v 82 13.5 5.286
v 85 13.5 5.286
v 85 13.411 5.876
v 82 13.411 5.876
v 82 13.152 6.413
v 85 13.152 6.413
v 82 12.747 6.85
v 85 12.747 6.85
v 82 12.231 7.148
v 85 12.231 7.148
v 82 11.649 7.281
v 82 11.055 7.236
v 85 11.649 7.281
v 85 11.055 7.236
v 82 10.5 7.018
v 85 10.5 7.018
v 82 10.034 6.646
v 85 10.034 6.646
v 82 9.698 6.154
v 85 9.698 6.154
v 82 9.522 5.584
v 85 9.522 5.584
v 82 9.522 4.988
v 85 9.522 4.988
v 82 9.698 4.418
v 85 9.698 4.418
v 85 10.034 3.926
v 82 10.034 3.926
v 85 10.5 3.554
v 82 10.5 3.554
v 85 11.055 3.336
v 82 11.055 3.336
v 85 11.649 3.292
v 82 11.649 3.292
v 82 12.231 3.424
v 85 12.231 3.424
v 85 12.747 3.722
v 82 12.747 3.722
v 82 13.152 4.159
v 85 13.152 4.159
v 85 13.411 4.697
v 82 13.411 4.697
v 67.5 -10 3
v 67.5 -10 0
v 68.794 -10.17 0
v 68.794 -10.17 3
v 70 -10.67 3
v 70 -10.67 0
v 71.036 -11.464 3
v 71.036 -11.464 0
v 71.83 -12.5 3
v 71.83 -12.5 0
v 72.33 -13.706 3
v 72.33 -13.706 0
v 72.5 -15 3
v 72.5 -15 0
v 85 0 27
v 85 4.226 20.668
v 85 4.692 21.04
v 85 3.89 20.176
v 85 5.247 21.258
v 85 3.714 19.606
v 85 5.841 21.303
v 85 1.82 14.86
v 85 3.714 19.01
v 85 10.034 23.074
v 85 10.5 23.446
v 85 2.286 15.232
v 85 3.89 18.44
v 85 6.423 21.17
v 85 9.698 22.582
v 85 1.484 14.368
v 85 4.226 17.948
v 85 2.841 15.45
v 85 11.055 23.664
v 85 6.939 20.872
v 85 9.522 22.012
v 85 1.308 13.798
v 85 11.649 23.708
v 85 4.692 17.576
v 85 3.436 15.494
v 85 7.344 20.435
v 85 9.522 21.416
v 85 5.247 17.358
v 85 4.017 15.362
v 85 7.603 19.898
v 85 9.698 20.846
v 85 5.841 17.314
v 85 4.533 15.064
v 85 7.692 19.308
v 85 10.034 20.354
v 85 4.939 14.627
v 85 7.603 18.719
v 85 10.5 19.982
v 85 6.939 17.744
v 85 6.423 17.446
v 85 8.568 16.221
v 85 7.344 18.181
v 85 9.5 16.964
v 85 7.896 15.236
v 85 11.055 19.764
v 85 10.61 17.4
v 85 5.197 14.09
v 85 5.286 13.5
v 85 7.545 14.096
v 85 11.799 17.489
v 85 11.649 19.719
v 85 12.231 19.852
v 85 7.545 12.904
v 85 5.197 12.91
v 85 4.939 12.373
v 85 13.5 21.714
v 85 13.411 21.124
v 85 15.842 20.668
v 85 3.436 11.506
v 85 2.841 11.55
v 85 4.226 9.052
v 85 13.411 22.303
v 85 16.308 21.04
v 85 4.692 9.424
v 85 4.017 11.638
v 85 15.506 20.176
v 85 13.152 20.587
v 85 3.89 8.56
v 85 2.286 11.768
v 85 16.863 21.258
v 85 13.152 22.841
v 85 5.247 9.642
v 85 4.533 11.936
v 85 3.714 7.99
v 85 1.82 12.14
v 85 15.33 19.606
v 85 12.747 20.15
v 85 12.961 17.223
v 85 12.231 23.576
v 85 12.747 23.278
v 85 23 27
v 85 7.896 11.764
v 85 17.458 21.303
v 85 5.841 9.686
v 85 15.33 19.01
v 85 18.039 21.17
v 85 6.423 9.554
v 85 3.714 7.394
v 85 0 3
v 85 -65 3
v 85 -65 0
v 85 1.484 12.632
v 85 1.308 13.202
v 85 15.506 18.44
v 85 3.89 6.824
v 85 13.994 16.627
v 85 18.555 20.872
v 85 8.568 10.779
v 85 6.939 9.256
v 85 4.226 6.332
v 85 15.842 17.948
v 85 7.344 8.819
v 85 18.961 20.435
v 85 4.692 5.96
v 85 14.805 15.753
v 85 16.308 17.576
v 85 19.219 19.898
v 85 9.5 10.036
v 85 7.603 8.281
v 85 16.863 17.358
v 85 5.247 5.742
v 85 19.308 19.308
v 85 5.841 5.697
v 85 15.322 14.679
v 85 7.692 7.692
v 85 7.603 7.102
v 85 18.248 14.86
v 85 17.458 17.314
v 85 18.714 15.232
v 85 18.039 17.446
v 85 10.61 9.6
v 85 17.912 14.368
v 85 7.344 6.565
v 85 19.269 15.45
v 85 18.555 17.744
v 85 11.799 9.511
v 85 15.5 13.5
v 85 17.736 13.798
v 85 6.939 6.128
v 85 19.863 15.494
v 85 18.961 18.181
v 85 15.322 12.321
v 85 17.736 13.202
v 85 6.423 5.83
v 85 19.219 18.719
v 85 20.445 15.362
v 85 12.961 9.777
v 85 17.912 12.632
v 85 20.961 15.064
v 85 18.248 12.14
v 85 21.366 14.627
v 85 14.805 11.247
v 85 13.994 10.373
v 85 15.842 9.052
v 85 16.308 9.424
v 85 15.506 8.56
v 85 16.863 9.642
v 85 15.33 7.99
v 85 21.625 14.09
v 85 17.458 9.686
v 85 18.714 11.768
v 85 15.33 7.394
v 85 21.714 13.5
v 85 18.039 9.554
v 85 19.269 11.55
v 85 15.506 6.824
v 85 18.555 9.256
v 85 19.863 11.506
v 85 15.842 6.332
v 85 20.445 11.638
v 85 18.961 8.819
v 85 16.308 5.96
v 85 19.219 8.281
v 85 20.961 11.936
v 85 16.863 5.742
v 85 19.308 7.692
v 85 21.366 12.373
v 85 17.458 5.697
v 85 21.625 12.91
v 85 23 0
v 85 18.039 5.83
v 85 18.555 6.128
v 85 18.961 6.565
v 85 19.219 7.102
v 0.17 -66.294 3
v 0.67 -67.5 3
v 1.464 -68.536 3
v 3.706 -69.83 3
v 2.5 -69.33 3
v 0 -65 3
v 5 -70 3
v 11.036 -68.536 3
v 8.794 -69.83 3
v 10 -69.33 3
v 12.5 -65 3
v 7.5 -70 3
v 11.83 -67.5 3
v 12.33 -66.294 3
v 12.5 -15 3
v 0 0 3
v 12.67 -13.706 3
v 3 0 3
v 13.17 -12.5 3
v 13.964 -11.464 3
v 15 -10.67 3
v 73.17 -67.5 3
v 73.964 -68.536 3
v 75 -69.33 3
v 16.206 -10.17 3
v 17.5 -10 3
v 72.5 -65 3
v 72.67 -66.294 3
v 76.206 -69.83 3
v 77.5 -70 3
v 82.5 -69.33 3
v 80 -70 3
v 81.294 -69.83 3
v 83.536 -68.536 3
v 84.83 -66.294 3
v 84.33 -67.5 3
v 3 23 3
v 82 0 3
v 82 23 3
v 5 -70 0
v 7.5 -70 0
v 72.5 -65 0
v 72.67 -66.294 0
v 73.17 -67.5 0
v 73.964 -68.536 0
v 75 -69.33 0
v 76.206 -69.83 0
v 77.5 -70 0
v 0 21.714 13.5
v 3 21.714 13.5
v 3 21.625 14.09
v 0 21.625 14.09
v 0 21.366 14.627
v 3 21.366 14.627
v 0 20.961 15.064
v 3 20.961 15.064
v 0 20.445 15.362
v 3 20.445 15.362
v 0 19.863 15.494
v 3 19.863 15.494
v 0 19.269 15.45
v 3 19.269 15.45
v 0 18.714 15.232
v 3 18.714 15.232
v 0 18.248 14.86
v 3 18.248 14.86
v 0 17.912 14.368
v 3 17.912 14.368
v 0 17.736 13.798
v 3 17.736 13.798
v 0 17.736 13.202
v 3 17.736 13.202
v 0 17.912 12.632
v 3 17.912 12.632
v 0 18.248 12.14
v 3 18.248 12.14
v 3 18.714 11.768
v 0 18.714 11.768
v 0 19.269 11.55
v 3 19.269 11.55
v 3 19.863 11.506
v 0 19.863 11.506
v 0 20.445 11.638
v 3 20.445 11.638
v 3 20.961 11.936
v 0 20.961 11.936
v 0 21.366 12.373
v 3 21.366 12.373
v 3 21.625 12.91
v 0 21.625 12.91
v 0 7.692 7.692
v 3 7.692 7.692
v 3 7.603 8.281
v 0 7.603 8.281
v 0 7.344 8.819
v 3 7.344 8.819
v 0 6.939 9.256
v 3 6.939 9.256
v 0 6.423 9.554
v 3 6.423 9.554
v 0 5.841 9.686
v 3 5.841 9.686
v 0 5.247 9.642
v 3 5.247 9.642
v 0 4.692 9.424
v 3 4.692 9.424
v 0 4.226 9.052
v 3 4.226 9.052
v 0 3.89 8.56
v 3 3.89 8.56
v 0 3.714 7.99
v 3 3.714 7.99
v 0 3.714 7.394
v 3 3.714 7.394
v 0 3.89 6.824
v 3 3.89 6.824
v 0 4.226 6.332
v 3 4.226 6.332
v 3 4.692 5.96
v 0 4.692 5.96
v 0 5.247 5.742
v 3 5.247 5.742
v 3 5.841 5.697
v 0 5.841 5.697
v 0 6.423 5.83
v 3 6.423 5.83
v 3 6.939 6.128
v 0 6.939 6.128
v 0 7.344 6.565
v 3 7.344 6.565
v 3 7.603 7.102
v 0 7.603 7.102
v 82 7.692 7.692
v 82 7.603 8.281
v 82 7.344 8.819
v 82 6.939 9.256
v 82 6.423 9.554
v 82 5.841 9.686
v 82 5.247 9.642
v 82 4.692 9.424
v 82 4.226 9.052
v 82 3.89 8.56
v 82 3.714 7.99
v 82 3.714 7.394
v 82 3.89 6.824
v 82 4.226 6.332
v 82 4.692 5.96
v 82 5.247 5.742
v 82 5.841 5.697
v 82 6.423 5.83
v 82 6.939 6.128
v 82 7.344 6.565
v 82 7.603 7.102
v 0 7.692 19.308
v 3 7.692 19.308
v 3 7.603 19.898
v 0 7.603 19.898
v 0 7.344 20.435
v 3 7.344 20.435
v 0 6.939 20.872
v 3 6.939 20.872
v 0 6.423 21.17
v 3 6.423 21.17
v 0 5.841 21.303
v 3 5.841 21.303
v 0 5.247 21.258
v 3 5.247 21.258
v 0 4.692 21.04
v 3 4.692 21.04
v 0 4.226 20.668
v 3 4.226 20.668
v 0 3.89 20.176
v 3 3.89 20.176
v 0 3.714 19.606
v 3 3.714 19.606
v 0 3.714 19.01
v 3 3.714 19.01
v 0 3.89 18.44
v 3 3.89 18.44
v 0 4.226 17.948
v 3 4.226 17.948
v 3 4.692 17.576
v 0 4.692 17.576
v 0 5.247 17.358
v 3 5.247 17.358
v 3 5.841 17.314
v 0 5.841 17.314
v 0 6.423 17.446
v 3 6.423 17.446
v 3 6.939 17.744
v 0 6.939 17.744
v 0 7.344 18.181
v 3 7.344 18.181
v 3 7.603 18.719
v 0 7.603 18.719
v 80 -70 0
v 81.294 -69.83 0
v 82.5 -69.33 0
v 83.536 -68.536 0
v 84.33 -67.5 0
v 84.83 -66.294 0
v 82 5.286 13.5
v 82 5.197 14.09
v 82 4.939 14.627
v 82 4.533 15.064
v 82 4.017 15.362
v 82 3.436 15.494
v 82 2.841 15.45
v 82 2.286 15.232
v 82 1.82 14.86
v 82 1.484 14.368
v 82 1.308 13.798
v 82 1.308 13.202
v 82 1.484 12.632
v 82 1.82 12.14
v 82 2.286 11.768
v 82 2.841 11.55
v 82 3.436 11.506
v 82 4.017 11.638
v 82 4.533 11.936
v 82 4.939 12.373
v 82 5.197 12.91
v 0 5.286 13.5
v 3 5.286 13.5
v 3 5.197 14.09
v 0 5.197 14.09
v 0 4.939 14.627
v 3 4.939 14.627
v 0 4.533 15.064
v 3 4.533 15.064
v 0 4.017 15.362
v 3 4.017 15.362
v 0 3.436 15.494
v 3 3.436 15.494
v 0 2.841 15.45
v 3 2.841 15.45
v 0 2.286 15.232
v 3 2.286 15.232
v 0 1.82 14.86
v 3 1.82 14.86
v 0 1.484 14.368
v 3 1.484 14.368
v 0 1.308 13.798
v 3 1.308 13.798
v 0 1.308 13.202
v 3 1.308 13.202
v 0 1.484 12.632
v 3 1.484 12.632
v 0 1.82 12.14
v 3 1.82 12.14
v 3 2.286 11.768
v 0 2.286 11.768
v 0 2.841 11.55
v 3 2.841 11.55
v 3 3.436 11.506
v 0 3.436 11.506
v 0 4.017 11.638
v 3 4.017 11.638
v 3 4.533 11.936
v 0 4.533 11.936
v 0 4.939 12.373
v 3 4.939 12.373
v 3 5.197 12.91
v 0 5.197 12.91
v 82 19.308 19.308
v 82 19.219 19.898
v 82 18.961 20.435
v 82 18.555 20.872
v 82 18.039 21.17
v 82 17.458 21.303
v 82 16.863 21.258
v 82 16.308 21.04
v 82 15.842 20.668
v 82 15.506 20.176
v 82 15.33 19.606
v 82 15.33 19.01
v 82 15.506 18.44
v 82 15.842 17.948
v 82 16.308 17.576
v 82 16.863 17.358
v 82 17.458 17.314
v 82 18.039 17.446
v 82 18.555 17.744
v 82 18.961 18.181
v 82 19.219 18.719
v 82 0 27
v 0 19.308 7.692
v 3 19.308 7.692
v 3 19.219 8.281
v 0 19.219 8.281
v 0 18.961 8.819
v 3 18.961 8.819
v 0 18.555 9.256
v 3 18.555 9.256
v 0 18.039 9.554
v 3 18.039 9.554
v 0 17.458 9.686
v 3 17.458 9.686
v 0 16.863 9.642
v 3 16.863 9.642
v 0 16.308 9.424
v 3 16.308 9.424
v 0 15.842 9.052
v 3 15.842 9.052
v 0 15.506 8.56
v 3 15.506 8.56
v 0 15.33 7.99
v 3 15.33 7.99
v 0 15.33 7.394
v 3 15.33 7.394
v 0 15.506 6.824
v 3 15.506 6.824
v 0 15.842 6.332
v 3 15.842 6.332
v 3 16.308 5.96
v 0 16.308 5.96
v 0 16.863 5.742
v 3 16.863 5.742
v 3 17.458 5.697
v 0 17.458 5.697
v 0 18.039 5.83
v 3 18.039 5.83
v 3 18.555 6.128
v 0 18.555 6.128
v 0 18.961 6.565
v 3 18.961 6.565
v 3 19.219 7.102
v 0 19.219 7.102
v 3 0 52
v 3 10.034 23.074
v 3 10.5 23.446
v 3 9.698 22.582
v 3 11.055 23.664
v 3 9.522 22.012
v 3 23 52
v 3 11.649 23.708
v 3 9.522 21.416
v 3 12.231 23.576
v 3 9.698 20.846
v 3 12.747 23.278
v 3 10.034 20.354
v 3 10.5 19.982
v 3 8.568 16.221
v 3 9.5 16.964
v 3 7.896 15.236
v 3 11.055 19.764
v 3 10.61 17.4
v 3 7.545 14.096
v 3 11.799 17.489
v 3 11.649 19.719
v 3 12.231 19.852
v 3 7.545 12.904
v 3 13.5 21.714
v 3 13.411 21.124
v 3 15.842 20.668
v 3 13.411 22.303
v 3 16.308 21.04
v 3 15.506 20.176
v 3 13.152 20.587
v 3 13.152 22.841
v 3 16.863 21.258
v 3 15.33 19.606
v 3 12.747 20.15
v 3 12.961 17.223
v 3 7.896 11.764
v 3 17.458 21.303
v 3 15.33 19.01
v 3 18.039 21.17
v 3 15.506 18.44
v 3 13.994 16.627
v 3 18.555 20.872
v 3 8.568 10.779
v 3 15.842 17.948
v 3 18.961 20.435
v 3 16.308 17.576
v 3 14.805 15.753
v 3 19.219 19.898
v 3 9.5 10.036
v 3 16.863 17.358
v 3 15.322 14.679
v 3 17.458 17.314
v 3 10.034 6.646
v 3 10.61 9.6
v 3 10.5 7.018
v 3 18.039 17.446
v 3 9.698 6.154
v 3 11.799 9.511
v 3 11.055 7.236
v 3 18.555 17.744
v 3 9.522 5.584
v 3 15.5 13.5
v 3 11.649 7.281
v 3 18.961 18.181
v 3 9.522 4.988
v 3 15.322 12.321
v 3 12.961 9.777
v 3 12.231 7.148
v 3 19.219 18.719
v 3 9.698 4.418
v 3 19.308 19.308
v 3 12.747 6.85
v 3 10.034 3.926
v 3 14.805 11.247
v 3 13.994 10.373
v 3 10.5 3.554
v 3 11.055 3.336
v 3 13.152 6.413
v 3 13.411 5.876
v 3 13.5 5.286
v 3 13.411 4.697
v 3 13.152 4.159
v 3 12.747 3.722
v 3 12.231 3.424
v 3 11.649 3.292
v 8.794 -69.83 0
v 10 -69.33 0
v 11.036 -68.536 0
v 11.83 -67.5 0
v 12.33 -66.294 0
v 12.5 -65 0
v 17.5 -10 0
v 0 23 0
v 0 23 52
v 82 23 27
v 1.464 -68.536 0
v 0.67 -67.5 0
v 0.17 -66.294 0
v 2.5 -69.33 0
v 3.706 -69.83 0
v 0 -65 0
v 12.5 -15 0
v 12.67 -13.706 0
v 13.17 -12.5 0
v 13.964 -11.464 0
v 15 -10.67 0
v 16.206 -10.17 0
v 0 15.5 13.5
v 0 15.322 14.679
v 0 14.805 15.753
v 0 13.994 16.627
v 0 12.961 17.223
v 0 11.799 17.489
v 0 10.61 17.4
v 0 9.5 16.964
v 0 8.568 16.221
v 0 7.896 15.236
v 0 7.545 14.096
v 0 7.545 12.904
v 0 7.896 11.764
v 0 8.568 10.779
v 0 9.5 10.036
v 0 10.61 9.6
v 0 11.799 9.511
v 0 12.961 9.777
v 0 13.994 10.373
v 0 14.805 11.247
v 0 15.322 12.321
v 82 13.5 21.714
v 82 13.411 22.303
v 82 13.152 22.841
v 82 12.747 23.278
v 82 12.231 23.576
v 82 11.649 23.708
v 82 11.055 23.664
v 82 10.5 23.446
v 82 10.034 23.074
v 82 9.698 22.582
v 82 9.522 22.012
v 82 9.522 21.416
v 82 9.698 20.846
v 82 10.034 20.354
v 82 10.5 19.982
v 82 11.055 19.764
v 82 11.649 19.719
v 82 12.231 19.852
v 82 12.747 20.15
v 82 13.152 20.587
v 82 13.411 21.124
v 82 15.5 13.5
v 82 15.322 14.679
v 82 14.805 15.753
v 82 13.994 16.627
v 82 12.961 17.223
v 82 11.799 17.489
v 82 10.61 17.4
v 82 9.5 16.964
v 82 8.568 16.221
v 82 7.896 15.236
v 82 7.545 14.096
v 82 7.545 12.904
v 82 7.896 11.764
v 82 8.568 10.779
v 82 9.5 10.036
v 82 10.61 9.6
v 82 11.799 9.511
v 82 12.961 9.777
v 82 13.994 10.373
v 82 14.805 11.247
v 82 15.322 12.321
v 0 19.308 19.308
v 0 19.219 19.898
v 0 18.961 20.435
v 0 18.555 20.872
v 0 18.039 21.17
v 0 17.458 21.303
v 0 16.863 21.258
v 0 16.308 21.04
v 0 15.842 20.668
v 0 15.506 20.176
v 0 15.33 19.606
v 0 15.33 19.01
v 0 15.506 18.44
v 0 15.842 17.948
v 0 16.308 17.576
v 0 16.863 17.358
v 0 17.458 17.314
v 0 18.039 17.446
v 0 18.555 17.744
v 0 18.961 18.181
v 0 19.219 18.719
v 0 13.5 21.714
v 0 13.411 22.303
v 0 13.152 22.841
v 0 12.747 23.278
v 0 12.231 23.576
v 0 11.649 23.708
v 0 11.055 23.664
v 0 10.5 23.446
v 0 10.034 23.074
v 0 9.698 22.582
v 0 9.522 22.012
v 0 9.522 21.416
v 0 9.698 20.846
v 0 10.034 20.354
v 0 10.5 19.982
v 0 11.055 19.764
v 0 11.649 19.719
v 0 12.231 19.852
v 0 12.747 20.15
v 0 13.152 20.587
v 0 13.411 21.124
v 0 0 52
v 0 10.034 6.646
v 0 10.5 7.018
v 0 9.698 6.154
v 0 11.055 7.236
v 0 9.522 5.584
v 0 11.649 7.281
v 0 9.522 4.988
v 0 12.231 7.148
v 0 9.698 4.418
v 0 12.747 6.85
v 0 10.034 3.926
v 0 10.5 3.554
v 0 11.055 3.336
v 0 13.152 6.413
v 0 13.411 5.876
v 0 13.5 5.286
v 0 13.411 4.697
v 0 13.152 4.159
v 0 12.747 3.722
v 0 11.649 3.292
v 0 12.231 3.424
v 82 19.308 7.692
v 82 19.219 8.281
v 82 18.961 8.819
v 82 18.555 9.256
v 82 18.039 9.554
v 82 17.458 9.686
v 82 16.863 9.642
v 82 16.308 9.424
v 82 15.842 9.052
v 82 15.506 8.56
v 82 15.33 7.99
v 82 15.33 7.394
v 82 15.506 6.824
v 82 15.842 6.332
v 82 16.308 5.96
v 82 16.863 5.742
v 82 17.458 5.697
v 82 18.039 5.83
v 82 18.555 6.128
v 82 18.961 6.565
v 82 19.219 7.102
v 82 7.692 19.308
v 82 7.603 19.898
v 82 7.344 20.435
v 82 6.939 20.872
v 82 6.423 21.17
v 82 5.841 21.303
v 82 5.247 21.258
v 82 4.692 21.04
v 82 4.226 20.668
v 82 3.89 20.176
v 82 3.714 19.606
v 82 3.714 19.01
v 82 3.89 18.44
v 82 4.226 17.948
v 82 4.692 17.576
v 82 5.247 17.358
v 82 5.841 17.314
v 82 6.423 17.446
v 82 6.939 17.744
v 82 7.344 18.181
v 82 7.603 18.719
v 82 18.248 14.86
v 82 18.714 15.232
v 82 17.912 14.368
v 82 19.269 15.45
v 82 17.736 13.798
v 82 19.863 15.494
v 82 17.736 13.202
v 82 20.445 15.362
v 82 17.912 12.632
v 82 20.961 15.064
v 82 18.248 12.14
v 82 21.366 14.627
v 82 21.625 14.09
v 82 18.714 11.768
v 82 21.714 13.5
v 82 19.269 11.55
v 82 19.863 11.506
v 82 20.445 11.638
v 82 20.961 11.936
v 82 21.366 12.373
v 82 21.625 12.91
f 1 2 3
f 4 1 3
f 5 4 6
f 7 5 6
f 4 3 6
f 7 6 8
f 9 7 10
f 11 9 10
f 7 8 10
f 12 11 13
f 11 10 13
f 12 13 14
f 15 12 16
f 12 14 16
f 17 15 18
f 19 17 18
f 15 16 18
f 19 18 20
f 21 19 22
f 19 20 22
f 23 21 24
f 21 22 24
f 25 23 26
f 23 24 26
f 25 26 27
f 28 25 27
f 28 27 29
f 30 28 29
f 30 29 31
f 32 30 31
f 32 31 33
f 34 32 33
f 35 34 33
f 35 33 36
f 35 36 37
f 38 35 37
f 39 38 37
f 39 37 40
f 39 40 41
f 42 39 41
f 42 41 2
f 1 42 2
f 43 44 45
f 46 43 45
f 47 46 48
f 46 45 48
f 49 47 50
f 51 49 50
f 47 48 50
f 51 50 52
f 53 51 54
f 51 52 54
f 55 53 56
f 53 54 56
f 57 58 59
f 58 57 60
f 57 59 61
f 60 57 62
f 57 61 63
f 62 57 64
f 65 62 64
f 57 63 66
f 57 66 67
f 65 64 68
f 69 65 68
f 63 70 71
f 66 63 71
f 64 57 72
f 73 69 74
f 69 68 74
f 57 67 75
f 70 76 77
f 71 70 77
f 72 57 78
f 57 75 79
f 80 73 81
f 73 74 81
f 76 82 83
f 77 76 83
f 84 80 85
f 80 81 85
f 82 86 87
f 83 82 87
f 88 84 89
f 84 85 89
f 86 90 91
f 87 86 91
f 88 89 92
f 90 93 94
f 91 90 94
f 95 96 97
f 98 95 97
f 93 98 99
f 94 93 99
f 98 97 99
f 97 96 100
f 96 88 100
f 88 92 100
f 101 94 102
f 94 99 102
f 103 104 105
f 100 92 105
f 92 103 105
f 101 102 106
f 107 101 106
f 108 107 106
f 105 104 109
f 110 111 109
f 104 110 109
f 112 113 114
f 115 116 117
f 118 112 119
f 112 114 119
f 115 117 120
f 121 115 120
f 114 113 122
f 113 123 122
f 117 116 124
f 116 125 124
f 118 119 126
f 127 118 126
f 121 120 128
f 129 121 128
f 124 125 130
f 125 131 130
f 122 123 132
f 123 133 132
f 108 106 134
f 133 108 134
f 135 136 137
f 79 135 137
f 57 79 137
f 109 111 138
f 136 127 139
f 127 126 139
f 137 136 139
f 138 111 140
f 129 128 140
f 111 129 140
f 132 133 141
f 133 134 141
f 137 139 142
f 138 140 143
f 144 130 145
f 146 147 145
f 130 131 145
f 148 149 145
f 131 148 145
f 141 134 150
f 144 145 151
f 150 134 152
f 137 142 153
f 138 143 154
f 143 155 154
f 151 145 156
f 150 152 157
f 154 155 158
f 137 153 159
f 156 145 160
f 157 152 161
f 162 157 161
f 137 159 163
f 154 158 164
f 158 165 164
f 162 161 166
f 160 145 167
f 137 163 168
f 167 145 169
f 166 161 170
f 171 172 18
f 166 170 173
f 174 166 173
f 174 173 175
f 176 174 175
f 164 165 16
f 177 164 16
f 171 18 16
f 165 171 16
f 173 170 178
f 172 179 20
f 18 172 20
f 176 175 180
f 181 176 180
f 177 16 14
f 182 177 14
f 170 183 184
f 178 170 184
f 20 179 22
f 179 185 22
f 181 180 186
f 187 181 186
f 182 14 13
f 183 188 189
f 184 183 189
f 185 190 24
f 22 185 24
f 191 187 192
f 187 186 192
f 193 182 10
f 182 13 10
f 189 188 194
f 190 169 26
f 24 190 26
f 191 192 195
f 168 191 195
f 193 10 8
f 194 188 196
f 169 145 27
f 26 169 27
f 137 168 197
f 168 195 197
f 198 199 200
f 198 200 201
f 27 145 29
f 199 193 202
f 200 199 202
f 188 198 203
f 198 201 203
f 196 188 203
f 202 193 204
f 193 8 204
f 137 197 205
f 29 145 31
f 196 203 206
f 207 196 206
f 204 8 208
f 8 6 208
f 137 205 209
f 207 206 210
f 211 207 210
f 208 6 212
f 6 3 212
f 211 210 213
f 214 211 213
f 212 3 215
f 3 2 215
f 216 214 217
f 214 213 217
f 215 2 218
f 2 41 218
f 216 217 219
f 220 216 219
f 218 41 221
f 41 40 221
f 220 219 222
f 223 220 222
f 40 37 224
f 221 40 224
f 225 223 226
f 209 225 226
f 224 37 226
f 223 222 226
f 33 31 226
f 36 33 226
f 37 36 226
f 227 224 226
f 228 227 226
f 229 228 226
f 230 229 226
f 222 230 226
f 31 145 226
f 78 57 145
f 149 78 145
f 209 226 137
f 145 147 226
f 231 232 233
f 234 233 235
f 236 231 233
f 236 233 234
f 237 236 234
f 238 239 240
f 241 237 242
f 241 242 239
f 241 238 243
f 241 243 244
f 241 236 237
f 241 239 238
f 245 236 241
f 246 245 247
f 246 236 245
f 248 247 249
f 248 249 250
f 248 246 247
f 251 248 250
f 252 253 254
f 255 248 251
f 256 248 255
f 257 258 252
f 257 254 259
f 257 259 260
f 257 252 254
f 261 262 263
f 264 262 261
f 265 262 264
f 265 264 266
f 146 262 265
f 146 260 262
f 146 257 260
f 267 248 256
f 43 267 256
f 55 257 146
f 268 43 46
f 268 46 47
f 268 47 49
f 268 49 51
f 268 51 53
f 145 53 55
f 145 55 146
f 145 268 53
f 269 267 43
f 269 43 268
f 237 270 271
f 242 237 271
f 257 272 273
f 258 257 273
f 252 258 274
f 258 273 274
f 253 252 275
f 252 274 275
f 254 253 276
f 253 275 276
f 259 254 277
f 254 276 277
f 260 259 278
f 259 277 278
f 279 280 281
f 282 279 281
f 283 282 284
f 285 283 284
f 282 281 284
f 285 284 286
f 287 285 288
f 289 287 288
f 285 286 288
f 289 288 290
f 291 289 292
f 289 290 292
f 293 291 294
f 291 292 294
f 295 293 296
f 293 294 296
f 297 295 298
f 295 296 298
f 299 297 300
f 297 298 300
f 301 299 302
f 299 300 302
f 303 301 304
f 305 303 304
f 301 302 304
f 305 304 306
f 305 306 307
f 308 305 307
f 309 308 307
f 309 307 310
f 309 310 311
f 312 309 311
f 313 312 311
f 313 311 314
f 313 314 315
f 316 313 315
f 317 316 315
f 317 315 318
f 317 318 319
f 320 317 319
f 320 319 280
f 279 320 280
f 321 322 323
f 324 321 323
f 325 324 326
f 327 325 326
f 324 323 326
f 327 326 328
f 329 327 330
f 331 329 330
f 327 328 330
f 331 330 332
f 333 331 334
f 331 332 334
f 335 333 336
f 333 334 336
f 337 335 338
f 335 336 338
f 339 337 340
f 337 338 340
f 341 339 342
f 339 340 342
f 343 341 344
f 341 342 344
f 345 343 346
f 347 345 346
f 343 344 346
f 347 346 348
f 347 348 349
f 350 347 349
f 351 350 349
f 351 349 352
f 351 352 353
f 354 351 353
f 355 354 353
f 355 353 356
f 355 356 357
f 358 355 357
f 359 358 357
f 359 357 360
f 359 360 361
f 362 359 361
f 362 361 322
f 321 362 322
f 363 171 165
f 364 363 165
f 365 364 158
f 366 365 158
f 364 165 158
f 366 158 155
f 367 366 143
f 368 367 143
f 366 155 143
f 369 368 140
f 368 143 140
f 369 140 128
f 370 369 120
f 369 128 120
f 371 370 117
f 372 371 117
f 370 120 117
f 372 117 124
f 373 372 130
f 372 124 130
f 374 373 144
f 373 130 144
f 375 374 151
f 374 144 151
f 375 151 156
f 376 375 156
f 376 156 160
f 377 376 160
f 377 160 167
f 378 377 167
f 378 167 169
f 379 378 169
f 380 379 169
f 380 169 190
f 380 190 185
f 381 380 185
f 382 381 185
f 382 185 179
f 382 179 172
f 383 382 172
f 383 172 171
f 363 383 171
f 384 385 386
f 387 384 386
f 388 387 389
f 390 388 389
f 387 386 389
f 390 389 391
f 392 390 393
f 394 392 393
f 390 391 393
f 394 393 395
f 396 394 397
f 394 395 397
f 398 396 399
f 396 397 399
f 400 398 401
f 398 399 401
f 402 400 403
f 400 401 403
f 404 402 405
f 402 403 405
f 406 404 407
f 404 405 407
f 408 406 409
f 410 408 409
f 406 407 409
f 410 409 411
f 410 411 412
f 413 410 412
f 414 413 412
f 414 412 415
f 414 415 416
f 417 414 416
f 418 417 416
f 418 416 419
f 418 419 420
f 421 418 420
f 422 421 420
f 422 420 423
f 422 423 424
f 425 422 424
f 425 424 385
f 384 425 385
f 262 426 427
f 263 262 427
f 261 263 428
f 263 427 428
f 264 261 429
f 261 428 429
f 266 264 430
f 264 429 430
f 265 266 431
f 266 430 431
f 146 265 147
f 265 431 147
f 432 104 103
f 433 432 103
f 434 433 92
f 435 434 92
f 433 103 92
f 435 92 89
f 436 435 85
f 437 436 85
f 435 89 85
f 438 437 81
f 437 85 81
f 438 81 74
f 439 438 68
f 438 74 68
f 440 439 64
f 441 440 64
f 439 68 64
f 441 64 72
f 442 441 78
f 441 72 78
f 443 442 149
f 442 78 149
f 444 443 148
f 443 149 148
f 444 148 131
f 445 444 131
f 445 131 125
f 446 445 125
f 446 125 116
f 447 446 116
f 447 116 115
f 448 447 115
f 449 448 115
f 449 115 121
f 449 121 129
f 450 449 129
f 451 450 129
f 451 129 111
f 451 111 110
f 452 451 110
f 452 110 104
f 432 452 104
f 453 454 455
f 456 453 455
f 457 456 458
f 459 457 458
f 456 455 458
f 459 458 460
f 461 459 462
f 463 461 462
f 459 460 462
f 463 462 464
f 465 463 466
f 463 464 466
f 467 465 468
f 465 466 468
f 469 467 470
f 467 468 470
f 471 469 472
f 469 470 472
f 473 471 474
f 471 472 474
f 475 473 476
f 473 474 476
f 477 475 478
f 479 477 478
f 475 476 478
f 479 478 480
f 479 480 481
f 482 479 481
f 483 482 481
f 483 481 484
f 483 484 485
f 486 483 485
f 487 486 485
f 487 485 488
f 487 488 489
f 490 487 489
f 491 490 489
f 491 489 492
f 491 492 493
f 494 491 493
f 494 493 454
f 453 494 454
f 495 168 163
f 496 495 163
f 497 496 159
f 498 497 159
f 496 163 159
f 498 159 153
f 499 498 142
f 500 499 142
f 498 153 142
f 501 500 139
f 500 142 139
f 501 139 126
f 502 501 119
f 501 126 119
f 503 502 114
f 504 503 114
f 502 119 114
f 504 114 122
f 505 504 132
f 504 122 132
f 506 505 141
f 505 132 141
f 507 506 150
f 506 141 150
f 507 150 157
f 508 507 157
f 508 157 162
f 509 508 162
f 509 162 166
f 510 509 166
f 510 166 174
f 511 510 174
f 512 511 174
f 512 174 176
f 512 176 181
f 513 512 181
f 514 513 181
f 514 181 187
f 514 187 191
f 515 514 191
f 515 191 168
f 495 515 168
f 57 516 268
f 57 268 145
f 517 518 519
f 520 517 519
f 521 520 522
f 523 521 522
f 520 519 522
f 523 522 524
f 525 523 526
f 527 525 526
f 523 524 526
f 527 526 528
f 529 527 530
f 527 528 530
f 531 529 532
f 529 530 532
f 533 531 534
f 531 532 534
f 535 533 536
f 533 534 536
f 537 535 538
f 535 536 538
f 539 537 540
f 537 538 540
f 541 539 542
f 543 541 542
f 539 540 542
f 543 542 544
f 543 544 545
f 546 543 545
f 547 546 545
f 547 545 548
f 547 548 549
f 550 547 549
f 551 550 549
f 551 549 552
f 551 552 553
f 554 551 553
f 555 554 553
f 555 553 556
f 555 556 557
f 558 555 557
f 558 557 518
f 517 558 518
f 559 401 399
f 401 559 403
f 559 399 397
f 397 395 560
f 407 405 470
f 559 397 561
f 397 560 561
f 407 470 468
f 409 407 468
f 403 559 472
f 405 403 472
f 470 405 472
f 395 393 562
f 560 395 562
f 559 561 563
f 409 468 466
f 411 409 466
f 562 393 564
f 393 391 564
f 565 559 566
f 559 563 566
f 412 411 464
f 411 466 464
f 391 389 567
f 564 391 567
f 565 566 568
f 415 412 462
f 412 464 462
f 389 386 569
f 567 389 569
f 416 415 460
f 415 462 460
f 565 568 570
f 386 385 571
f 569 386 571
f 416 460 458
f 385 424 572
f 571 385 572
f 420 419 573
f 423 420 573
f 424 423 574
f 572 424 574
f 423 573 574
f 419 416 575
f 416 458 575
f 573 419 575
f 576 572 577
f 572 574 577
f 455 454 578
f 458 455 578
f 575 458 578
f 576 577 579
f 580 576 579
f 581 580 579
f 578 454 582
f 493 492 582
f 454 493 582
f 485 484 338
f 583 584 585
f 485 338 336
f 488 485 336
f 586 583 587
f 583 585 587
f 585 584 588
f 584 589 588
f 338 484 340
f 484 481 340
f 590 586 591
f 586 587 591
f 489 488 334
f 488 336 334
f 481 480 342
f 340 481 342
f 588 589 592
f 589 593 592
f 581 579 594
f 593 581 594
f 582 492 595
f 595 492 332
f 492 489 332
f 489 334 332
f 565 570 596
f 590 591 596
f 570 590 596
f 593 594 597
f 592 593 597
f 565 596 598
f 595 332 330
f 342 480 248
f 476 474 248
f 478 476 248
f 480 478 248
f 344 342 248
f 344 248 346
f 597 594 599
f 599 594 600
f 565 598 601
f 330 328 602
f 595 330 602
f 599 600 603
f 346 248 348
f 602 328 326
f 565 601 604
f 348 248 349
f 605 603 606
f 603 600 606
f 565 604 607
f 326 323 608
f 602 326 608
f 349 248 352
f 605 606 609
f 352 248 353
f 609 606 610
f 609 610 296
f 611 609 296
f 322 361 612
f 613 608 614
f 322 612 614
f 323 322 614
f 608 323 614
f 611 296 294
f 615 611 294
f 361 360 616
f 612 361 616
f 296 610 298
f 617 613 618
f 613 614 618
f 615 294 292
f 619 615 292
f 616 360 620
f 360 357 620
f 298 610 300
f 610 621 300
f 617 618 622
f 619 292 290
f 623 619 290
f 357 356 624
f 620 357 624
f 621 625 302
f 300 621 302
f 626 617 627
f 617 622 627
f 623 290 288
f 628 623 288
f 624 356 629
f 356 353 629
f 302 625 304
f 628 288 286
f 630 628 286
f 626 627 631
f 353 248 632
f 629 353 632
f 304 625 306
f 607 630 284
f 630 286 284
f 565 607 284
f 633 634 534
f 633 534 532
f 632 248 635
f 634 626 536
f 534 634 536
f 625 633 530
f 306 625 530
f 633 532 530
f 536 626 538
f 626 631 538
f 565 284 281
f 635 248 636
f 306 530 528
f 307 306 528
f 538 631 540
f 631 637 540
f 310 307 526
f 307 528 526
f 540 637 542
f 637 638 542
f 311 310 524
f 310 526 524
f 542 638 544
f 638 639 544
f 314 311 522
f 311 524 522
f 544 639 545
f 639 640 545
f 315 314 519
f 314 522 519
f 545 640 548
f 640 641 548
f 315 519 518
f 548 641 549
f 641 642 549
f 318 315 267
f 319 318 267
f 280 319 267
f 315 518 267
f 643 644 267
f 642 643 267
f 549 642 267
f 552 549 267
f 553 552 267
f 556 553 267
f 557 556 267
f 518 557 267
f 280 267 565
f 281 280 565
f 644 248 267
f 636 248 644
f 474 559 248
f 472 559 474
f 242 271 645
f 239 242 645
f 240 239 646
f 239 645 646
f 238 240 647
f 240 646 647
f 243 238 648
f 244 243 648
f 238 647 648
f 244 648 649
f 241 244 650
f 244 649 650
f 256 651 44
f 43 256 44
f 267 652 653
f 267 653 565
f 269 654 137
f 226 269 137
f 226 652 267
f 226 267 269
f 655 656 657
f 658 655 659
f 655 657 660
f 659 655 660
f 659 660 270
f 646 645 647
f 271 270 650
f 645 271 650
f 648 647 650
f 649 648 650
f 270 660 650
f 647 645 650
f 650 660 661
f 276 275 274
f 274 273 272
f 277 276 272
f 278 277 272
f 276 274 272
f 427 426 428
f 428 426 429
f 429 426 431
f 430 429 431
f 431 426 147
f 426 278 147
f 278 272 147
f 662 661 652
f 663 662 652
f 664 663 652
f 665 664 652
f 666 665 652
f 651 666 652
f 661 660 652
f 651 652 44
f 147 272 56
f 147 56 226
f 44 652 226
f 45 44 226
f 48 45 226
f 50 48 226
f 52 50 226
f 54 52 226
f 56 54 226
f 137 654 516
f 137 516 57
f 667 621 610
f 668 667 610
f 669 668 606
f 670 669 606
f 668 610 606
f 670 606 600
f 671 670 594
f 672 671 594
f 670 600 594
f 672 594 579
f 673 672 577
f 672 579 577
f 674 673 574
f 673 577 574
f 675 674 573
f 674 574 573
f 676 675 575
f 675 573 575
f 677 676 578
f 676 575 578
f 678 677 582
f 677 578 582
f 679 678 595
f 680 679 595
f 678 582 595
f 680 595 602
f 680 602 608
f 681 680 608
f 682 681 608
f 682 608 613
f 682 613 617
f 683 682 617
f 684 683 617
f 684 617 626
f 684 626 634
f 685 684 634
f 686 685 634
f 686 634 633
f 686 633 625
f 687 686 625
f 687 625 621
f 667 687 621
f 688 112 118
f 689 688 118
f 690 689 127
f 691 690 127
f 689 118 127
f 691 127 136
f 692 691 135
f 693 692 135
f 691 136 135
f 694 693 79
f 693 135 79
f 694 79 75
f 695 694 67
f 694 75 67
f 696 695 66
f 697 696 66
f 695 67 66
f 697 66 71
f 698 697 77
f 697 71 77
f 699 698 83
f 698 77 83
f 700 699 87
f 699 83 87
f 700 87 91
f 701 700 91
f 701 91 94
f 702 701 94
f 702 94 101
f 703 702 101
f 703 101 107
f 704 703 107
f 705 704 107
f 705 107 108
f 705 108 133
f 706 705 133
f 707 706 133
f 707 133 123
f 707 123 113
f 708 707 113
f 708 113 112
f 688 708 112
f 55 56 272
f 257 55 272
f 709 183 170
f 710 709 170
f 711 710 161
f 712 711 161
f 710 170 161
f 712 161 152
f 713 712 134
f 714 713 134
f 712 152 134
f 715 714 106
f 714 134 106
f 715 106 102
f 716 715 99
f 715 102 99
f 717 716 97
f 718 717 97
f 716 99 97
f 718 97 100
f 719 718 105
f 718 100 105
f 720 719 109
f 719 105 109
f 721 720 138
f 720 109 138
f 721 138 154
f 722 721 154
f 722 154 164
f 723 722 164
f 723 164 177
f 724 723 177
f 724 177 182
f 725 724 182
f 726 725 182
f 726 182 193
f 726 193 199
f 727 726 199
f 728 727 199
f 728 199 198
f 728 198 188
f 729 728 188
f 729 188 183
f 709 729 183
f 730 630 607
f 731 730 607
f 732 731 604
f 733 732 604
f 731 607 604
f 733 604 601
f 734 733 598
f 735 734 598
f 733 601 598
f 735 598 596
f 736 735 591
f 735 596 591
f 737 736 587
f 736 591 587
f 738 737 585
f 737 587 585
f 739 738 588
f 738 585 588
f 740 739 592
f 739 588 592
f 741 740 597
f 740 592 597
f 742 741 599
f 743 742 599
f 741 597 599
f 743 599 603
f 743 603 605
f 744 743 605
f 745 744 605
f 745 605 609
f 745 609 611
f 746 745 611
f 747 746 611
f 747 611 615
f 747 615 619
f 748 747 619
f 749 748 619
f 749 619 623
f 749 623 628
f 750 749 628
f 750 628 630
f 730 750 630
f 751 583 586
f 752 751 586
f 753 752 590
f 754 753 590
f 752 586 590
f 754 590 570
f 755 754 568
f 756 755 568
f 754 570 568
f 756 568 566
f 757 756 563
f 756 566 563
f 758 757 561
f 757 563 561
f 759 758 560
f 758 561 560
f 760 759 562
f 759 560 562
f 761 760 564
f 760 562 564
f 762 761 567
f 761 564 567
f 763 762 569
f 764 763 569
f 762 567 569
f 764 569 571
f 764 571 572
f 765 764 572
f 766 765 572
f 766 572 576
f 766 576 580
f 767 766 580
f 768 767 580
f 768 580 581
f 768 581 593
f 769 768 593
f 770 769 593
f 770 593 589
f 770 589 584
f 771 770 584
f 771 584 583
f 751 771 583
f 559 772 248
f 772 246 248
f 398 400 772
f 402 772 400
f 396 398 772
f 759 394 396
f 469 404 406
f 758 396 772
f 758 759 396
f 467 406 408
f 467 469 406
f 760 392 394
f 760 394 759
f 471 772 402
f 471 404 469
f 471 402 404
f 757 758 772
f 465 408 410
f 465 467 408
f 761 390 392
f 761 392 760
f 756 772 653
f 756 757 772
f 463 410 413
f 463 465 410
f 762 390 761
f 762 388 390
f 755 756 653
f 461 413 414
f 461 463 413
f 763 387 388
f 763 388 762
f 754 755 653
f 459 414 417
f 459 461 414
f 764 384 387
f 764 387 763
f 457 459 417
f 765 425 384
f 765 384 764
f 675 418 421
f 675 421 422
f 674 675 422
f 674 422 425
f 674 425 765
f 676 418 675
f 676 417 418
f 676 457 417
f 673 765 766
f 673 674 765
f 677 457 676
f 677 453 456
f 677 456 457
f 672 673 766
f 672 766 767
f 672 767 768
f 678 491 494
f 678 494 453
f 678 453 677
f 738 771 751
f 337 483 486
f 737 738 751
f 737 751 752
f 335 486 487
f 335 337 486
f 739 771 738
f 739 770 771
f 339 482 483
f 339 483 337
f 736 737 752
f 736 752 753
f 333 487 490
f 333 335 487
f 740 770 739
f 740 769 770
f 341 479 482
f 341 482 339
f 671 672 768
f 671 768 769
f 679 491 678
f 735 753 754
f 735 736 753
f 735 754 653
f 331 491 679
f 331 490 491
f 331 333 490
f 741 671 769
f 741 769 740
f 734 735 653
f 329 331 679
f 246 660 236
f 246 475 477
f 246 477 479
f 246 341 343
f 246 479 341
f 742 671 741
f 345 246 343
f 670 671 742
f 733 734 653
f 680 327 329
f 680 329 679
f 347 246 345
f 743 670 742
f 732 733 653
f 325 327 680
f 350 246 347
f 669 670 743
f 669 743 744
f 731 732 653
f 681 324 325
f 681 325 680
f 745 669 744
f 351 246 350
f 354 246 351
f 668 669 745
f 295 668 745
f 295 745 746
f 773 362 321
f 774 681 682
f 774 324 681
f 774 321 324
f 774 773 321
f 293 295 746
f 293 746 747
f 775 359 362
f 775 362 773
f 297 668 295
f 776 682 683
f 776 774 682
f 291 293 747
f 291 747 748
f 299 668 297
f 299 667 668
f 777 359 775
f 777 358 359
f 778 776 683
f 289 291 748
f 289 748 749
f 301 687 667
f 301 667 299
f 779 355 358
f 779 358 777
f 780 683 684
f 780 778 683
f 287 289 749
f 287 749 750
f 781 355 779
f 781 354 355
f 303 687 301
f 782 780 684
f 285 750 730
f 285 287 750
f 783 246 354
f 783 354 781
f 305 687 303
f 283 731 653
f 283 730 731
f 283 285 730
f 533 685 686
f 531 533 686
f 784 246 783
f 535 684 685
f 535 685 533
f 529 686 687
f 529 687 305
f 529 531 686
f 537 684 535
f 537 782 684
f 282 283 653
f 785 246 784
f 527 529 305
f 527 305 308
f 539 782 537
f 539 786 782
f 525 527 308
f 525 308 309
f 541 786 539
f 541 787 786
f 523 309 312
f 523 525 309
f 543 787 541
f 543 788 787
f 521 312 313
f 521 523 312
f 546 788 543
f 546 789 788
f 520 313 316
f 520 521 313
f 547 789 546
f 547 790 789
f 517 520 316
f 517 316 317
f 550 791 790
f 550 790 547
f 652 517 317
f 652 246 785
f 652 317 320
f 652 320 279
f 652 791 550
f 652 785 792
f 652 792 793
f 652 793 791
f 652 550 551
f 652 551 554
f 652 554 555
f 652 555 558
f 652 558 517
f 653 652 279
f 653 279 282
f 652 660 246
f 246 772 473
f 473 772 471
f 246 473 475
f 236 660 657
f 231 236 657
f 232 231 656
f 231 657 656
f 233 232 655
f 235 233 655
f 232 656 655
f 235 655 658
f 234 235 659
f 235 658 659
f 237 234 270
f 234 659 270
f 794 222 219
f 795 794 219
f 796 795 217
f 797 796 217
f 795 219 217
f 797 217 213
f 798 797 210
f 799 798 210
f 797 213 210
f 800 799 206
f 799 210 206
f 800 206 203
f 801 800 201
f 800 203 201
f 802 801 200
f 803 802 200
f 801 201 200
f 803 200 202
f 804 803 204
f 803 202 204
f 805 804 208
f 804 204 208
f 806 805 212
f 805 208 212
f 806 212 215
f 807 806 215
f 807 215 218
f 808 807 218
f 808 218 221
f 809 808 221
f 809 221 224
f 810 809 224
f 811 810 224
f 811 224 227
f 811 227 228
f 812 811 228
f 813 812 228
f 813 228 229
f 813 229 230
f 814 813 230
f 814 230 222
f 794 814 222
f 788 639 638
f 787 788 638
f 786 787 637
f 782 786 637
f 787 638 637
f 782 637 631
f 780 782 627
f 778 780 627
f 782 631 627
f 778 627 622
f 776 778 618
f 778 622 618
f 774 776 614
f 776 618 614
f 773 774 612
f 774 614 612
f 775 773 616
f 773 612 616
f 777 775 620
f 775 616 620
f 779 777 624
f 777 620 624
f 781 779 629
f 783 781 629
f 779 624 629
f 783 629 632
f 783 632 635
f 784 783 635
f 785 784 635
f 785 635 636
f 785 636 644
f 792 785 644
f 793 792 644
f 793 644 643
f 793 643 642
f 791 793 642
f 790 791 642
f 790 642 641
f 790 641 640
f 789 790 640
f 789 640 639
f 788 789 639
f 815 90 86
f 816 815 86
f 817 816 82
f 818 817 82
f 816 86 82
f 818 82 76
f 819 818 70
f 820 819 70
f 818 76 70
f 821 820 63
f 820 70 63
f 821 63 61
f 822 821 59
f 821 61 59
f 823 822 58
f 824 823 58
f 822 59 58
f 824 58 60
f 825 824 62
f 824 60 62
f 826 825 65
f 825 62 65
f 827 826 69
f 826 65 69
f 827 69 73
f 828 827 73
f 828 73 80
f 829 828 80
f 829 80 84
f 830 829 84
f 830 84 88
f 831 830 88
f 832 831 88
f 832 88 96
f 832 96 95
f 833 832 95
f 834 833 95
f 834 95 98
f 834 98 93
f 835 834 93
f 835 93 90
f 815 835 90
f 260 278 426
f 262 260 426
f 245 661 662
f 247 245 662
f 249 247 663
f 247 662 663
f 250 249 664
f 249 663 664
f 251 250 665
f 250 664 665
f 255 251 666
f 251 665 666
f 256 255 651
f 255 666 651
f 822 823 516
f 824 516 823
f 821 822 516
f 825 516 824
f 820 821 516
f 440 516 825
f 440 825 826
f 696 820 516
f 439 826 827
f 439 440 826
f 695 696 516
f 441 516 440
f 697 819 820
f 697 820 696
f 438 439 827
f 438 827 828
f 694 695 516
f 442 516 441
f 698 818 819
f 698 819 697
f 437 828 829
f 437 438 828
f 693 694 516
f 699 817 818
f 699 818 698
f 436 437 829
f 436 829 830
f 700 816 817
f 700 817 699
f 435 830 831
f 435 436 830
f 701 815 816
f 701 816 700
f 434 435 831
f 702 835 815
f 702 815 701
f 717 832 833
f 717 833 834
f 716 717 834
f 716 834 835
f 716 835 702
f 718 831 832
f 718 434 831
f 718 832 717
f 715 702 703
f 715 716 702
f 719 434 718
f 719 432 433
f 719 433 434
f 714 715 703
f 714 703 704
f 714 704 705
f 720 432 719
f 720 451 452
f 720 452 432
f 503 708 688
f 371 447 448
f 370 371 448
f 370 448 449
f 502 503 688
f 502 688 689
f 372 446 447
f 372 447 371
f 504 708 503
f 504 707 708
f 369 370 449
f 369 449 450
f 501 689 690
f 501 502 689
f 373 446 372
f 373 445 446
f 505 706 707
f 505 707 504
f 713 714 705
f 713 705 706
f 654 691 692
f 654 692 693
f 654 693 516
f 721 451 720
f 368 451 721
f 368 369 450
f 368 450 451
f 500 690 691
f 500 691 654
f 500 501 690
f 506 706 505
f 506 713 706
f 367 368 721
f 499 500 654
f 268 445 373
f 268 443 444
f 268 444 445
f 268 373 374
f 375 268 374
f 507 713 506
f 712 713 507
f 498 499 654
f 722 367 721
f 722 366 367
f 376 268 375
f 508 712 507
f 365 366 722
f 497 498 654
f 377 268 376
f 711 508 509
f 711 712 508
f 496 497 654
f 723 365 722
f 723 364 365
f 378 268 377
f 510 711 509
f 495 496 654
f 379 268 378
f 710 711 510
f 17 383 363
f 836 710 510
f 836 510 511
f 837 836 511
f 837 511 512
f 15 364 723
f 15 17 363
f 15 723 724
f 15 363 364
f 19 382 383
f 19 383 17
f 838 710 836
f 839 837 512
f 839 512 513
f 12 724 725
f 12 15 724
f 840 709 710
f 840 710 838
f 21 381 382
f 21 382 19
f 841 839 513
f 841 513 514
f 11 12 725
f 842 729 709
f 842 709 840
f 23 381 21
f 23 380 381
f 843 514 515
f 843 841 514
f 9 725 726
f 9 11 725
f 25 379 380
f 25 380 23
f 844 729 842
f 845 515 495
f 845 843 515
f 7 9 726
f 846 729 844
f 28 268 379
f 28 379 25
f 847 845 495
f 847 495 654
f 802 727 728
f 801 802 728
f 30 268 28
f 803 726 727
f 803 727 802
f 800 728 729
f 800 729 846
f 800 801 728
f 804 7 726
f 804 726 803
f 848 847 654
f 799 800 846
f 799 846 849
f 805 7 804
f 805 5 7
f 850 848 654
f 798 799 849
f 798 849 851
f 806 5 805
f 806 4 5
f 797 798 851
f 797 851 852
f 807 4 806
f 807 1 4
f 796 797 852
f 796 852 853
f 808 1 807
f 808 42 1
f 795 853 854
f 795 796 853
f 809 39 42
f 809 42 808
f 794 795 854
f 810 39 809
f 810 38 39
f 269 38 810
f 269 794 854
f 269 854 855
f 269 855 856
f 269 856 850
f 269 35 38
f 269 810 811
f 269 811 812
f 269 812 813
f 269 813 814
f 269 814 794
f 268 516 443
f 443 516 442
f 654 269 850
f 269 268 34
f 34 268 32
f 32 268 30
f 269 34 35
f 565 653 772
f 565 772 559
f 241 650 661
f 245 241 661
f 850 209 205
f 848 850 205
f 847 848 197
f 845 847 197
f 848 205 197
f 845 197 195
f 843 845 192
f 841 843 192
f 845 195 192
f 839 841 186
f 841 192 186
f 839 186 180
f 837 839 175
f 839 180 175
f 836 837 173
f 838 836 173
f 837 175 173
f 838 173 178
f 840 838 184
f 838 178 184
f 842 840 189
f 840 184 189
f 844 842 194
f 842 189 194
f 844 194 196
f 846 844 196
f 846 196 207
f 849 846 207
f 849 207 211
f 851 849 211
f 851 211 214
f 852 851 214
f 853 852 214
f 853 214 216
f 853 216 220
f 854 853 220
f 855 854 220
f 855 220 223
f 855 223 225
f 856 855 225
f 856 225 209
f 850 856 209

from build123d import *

# Parameters (mm, degrees)
F0_W     = 85
F0_H     = 23
F1_DEPTH = 3
F2_W     = 3
F2_H     = 23
F3_DEPTH = 24
F4_W     = 3
F4_H     = 23
F5_DEPTH = 25
F6_R     = 4
F6_R_2   = 2
F7_DEPTH = 100


with BuildPart() as f1:
    # F0 (on Top) → F1 (new body)
    with BuildSketch(Plane.XY):
        with Locations((42.5, 11.5)):
            Rectangle(F0_W, F0_H)
        with BuildLine():
            Line((85, 0), (0, 0))
            Line((0, 0), (0, -10))
            Line((0, -10), (0, -65))
            ThreePointArc((0, -65), (1.464466, -68.535534), (5, -70))
            Line((5, -70), (7.5, -70))
            ThreePointArc((7.5, -70), (11.035534, -68.535534), (12.5, -65))
            Line((12.5, -65), (12.5, -15))
            ThreePointArc((12.5, -15), (13.964466, -11.464466), (17.5, -10))
            Line((17.5, -10), (67.5, -10))
            ThreePointArc((67.5, -10), (71.035534, -11.464466), (72.5, -15))
            Line((72.5, -15), (72.5, -65))
            ThreePointArc((72.5, -65), (73.964466, -68.535534), (77.5, -70))
            Line((77.5, -70), (80, -70))
            ThreePointArc((80, -70), (83.535534, -68.535534), (85, -65))
            Line((85, -65), (85, -10))
            Line((85, -10), (85, 0))
        make_face()
    extrude(amount=F1_DEPTH)

    # F2 (on face) → F3 (join)
    with BuildSketch(Plane.XY.offset(3)):
        with Locations((1.5, 11.5)):
            Rectangle(F2_W, F2_H)
        with Locations((83.5, 11.5)):
            Rectangle(F2_W, F2_H)
    extrude(amount=F3_DEPTH)

    # F4 (on face) → F5 (join)
    with BuildSketch(Plane.XY.offset(27)):
        with Locations((1.5, 11.5)):
            Rectangle(F4_W, F4_H)
    extrude(amount=F5_DEPTH)

    # F6 (on face) → F7 (cut)
    with BuildSketch(Plane.YZ.offset(85)):
        with Locations((11.5, 13.5)):
            Circle(F6_R)
        with Locations((19.713903, 13.5)):
            Circle(F6_R_2)
        with Locations((17.308106, 19.308106)):
            Circle(F6_R_2)
        with Locations((11.5, 21.713903)):
            Circle(F6_R_2)
        with Locations((5.691894, 19.308106)):
            Circle(F6_R_2)
        with Locations((3.286097, 13.5)):
            Circle(F6_R_2)
        with Locations((5.691894, 7.691894)):
            Circle(F6_R_2)
        with Locations((11.5, 5.286097)):
            Circle(F6_R_2)
        with Locations((17.308106, 7.691894)):
            Circle(F6_R_2)
    extrude(amount=-F7_DEPTH, mode=Mode.SUBTRACT)


solid = f1.part
